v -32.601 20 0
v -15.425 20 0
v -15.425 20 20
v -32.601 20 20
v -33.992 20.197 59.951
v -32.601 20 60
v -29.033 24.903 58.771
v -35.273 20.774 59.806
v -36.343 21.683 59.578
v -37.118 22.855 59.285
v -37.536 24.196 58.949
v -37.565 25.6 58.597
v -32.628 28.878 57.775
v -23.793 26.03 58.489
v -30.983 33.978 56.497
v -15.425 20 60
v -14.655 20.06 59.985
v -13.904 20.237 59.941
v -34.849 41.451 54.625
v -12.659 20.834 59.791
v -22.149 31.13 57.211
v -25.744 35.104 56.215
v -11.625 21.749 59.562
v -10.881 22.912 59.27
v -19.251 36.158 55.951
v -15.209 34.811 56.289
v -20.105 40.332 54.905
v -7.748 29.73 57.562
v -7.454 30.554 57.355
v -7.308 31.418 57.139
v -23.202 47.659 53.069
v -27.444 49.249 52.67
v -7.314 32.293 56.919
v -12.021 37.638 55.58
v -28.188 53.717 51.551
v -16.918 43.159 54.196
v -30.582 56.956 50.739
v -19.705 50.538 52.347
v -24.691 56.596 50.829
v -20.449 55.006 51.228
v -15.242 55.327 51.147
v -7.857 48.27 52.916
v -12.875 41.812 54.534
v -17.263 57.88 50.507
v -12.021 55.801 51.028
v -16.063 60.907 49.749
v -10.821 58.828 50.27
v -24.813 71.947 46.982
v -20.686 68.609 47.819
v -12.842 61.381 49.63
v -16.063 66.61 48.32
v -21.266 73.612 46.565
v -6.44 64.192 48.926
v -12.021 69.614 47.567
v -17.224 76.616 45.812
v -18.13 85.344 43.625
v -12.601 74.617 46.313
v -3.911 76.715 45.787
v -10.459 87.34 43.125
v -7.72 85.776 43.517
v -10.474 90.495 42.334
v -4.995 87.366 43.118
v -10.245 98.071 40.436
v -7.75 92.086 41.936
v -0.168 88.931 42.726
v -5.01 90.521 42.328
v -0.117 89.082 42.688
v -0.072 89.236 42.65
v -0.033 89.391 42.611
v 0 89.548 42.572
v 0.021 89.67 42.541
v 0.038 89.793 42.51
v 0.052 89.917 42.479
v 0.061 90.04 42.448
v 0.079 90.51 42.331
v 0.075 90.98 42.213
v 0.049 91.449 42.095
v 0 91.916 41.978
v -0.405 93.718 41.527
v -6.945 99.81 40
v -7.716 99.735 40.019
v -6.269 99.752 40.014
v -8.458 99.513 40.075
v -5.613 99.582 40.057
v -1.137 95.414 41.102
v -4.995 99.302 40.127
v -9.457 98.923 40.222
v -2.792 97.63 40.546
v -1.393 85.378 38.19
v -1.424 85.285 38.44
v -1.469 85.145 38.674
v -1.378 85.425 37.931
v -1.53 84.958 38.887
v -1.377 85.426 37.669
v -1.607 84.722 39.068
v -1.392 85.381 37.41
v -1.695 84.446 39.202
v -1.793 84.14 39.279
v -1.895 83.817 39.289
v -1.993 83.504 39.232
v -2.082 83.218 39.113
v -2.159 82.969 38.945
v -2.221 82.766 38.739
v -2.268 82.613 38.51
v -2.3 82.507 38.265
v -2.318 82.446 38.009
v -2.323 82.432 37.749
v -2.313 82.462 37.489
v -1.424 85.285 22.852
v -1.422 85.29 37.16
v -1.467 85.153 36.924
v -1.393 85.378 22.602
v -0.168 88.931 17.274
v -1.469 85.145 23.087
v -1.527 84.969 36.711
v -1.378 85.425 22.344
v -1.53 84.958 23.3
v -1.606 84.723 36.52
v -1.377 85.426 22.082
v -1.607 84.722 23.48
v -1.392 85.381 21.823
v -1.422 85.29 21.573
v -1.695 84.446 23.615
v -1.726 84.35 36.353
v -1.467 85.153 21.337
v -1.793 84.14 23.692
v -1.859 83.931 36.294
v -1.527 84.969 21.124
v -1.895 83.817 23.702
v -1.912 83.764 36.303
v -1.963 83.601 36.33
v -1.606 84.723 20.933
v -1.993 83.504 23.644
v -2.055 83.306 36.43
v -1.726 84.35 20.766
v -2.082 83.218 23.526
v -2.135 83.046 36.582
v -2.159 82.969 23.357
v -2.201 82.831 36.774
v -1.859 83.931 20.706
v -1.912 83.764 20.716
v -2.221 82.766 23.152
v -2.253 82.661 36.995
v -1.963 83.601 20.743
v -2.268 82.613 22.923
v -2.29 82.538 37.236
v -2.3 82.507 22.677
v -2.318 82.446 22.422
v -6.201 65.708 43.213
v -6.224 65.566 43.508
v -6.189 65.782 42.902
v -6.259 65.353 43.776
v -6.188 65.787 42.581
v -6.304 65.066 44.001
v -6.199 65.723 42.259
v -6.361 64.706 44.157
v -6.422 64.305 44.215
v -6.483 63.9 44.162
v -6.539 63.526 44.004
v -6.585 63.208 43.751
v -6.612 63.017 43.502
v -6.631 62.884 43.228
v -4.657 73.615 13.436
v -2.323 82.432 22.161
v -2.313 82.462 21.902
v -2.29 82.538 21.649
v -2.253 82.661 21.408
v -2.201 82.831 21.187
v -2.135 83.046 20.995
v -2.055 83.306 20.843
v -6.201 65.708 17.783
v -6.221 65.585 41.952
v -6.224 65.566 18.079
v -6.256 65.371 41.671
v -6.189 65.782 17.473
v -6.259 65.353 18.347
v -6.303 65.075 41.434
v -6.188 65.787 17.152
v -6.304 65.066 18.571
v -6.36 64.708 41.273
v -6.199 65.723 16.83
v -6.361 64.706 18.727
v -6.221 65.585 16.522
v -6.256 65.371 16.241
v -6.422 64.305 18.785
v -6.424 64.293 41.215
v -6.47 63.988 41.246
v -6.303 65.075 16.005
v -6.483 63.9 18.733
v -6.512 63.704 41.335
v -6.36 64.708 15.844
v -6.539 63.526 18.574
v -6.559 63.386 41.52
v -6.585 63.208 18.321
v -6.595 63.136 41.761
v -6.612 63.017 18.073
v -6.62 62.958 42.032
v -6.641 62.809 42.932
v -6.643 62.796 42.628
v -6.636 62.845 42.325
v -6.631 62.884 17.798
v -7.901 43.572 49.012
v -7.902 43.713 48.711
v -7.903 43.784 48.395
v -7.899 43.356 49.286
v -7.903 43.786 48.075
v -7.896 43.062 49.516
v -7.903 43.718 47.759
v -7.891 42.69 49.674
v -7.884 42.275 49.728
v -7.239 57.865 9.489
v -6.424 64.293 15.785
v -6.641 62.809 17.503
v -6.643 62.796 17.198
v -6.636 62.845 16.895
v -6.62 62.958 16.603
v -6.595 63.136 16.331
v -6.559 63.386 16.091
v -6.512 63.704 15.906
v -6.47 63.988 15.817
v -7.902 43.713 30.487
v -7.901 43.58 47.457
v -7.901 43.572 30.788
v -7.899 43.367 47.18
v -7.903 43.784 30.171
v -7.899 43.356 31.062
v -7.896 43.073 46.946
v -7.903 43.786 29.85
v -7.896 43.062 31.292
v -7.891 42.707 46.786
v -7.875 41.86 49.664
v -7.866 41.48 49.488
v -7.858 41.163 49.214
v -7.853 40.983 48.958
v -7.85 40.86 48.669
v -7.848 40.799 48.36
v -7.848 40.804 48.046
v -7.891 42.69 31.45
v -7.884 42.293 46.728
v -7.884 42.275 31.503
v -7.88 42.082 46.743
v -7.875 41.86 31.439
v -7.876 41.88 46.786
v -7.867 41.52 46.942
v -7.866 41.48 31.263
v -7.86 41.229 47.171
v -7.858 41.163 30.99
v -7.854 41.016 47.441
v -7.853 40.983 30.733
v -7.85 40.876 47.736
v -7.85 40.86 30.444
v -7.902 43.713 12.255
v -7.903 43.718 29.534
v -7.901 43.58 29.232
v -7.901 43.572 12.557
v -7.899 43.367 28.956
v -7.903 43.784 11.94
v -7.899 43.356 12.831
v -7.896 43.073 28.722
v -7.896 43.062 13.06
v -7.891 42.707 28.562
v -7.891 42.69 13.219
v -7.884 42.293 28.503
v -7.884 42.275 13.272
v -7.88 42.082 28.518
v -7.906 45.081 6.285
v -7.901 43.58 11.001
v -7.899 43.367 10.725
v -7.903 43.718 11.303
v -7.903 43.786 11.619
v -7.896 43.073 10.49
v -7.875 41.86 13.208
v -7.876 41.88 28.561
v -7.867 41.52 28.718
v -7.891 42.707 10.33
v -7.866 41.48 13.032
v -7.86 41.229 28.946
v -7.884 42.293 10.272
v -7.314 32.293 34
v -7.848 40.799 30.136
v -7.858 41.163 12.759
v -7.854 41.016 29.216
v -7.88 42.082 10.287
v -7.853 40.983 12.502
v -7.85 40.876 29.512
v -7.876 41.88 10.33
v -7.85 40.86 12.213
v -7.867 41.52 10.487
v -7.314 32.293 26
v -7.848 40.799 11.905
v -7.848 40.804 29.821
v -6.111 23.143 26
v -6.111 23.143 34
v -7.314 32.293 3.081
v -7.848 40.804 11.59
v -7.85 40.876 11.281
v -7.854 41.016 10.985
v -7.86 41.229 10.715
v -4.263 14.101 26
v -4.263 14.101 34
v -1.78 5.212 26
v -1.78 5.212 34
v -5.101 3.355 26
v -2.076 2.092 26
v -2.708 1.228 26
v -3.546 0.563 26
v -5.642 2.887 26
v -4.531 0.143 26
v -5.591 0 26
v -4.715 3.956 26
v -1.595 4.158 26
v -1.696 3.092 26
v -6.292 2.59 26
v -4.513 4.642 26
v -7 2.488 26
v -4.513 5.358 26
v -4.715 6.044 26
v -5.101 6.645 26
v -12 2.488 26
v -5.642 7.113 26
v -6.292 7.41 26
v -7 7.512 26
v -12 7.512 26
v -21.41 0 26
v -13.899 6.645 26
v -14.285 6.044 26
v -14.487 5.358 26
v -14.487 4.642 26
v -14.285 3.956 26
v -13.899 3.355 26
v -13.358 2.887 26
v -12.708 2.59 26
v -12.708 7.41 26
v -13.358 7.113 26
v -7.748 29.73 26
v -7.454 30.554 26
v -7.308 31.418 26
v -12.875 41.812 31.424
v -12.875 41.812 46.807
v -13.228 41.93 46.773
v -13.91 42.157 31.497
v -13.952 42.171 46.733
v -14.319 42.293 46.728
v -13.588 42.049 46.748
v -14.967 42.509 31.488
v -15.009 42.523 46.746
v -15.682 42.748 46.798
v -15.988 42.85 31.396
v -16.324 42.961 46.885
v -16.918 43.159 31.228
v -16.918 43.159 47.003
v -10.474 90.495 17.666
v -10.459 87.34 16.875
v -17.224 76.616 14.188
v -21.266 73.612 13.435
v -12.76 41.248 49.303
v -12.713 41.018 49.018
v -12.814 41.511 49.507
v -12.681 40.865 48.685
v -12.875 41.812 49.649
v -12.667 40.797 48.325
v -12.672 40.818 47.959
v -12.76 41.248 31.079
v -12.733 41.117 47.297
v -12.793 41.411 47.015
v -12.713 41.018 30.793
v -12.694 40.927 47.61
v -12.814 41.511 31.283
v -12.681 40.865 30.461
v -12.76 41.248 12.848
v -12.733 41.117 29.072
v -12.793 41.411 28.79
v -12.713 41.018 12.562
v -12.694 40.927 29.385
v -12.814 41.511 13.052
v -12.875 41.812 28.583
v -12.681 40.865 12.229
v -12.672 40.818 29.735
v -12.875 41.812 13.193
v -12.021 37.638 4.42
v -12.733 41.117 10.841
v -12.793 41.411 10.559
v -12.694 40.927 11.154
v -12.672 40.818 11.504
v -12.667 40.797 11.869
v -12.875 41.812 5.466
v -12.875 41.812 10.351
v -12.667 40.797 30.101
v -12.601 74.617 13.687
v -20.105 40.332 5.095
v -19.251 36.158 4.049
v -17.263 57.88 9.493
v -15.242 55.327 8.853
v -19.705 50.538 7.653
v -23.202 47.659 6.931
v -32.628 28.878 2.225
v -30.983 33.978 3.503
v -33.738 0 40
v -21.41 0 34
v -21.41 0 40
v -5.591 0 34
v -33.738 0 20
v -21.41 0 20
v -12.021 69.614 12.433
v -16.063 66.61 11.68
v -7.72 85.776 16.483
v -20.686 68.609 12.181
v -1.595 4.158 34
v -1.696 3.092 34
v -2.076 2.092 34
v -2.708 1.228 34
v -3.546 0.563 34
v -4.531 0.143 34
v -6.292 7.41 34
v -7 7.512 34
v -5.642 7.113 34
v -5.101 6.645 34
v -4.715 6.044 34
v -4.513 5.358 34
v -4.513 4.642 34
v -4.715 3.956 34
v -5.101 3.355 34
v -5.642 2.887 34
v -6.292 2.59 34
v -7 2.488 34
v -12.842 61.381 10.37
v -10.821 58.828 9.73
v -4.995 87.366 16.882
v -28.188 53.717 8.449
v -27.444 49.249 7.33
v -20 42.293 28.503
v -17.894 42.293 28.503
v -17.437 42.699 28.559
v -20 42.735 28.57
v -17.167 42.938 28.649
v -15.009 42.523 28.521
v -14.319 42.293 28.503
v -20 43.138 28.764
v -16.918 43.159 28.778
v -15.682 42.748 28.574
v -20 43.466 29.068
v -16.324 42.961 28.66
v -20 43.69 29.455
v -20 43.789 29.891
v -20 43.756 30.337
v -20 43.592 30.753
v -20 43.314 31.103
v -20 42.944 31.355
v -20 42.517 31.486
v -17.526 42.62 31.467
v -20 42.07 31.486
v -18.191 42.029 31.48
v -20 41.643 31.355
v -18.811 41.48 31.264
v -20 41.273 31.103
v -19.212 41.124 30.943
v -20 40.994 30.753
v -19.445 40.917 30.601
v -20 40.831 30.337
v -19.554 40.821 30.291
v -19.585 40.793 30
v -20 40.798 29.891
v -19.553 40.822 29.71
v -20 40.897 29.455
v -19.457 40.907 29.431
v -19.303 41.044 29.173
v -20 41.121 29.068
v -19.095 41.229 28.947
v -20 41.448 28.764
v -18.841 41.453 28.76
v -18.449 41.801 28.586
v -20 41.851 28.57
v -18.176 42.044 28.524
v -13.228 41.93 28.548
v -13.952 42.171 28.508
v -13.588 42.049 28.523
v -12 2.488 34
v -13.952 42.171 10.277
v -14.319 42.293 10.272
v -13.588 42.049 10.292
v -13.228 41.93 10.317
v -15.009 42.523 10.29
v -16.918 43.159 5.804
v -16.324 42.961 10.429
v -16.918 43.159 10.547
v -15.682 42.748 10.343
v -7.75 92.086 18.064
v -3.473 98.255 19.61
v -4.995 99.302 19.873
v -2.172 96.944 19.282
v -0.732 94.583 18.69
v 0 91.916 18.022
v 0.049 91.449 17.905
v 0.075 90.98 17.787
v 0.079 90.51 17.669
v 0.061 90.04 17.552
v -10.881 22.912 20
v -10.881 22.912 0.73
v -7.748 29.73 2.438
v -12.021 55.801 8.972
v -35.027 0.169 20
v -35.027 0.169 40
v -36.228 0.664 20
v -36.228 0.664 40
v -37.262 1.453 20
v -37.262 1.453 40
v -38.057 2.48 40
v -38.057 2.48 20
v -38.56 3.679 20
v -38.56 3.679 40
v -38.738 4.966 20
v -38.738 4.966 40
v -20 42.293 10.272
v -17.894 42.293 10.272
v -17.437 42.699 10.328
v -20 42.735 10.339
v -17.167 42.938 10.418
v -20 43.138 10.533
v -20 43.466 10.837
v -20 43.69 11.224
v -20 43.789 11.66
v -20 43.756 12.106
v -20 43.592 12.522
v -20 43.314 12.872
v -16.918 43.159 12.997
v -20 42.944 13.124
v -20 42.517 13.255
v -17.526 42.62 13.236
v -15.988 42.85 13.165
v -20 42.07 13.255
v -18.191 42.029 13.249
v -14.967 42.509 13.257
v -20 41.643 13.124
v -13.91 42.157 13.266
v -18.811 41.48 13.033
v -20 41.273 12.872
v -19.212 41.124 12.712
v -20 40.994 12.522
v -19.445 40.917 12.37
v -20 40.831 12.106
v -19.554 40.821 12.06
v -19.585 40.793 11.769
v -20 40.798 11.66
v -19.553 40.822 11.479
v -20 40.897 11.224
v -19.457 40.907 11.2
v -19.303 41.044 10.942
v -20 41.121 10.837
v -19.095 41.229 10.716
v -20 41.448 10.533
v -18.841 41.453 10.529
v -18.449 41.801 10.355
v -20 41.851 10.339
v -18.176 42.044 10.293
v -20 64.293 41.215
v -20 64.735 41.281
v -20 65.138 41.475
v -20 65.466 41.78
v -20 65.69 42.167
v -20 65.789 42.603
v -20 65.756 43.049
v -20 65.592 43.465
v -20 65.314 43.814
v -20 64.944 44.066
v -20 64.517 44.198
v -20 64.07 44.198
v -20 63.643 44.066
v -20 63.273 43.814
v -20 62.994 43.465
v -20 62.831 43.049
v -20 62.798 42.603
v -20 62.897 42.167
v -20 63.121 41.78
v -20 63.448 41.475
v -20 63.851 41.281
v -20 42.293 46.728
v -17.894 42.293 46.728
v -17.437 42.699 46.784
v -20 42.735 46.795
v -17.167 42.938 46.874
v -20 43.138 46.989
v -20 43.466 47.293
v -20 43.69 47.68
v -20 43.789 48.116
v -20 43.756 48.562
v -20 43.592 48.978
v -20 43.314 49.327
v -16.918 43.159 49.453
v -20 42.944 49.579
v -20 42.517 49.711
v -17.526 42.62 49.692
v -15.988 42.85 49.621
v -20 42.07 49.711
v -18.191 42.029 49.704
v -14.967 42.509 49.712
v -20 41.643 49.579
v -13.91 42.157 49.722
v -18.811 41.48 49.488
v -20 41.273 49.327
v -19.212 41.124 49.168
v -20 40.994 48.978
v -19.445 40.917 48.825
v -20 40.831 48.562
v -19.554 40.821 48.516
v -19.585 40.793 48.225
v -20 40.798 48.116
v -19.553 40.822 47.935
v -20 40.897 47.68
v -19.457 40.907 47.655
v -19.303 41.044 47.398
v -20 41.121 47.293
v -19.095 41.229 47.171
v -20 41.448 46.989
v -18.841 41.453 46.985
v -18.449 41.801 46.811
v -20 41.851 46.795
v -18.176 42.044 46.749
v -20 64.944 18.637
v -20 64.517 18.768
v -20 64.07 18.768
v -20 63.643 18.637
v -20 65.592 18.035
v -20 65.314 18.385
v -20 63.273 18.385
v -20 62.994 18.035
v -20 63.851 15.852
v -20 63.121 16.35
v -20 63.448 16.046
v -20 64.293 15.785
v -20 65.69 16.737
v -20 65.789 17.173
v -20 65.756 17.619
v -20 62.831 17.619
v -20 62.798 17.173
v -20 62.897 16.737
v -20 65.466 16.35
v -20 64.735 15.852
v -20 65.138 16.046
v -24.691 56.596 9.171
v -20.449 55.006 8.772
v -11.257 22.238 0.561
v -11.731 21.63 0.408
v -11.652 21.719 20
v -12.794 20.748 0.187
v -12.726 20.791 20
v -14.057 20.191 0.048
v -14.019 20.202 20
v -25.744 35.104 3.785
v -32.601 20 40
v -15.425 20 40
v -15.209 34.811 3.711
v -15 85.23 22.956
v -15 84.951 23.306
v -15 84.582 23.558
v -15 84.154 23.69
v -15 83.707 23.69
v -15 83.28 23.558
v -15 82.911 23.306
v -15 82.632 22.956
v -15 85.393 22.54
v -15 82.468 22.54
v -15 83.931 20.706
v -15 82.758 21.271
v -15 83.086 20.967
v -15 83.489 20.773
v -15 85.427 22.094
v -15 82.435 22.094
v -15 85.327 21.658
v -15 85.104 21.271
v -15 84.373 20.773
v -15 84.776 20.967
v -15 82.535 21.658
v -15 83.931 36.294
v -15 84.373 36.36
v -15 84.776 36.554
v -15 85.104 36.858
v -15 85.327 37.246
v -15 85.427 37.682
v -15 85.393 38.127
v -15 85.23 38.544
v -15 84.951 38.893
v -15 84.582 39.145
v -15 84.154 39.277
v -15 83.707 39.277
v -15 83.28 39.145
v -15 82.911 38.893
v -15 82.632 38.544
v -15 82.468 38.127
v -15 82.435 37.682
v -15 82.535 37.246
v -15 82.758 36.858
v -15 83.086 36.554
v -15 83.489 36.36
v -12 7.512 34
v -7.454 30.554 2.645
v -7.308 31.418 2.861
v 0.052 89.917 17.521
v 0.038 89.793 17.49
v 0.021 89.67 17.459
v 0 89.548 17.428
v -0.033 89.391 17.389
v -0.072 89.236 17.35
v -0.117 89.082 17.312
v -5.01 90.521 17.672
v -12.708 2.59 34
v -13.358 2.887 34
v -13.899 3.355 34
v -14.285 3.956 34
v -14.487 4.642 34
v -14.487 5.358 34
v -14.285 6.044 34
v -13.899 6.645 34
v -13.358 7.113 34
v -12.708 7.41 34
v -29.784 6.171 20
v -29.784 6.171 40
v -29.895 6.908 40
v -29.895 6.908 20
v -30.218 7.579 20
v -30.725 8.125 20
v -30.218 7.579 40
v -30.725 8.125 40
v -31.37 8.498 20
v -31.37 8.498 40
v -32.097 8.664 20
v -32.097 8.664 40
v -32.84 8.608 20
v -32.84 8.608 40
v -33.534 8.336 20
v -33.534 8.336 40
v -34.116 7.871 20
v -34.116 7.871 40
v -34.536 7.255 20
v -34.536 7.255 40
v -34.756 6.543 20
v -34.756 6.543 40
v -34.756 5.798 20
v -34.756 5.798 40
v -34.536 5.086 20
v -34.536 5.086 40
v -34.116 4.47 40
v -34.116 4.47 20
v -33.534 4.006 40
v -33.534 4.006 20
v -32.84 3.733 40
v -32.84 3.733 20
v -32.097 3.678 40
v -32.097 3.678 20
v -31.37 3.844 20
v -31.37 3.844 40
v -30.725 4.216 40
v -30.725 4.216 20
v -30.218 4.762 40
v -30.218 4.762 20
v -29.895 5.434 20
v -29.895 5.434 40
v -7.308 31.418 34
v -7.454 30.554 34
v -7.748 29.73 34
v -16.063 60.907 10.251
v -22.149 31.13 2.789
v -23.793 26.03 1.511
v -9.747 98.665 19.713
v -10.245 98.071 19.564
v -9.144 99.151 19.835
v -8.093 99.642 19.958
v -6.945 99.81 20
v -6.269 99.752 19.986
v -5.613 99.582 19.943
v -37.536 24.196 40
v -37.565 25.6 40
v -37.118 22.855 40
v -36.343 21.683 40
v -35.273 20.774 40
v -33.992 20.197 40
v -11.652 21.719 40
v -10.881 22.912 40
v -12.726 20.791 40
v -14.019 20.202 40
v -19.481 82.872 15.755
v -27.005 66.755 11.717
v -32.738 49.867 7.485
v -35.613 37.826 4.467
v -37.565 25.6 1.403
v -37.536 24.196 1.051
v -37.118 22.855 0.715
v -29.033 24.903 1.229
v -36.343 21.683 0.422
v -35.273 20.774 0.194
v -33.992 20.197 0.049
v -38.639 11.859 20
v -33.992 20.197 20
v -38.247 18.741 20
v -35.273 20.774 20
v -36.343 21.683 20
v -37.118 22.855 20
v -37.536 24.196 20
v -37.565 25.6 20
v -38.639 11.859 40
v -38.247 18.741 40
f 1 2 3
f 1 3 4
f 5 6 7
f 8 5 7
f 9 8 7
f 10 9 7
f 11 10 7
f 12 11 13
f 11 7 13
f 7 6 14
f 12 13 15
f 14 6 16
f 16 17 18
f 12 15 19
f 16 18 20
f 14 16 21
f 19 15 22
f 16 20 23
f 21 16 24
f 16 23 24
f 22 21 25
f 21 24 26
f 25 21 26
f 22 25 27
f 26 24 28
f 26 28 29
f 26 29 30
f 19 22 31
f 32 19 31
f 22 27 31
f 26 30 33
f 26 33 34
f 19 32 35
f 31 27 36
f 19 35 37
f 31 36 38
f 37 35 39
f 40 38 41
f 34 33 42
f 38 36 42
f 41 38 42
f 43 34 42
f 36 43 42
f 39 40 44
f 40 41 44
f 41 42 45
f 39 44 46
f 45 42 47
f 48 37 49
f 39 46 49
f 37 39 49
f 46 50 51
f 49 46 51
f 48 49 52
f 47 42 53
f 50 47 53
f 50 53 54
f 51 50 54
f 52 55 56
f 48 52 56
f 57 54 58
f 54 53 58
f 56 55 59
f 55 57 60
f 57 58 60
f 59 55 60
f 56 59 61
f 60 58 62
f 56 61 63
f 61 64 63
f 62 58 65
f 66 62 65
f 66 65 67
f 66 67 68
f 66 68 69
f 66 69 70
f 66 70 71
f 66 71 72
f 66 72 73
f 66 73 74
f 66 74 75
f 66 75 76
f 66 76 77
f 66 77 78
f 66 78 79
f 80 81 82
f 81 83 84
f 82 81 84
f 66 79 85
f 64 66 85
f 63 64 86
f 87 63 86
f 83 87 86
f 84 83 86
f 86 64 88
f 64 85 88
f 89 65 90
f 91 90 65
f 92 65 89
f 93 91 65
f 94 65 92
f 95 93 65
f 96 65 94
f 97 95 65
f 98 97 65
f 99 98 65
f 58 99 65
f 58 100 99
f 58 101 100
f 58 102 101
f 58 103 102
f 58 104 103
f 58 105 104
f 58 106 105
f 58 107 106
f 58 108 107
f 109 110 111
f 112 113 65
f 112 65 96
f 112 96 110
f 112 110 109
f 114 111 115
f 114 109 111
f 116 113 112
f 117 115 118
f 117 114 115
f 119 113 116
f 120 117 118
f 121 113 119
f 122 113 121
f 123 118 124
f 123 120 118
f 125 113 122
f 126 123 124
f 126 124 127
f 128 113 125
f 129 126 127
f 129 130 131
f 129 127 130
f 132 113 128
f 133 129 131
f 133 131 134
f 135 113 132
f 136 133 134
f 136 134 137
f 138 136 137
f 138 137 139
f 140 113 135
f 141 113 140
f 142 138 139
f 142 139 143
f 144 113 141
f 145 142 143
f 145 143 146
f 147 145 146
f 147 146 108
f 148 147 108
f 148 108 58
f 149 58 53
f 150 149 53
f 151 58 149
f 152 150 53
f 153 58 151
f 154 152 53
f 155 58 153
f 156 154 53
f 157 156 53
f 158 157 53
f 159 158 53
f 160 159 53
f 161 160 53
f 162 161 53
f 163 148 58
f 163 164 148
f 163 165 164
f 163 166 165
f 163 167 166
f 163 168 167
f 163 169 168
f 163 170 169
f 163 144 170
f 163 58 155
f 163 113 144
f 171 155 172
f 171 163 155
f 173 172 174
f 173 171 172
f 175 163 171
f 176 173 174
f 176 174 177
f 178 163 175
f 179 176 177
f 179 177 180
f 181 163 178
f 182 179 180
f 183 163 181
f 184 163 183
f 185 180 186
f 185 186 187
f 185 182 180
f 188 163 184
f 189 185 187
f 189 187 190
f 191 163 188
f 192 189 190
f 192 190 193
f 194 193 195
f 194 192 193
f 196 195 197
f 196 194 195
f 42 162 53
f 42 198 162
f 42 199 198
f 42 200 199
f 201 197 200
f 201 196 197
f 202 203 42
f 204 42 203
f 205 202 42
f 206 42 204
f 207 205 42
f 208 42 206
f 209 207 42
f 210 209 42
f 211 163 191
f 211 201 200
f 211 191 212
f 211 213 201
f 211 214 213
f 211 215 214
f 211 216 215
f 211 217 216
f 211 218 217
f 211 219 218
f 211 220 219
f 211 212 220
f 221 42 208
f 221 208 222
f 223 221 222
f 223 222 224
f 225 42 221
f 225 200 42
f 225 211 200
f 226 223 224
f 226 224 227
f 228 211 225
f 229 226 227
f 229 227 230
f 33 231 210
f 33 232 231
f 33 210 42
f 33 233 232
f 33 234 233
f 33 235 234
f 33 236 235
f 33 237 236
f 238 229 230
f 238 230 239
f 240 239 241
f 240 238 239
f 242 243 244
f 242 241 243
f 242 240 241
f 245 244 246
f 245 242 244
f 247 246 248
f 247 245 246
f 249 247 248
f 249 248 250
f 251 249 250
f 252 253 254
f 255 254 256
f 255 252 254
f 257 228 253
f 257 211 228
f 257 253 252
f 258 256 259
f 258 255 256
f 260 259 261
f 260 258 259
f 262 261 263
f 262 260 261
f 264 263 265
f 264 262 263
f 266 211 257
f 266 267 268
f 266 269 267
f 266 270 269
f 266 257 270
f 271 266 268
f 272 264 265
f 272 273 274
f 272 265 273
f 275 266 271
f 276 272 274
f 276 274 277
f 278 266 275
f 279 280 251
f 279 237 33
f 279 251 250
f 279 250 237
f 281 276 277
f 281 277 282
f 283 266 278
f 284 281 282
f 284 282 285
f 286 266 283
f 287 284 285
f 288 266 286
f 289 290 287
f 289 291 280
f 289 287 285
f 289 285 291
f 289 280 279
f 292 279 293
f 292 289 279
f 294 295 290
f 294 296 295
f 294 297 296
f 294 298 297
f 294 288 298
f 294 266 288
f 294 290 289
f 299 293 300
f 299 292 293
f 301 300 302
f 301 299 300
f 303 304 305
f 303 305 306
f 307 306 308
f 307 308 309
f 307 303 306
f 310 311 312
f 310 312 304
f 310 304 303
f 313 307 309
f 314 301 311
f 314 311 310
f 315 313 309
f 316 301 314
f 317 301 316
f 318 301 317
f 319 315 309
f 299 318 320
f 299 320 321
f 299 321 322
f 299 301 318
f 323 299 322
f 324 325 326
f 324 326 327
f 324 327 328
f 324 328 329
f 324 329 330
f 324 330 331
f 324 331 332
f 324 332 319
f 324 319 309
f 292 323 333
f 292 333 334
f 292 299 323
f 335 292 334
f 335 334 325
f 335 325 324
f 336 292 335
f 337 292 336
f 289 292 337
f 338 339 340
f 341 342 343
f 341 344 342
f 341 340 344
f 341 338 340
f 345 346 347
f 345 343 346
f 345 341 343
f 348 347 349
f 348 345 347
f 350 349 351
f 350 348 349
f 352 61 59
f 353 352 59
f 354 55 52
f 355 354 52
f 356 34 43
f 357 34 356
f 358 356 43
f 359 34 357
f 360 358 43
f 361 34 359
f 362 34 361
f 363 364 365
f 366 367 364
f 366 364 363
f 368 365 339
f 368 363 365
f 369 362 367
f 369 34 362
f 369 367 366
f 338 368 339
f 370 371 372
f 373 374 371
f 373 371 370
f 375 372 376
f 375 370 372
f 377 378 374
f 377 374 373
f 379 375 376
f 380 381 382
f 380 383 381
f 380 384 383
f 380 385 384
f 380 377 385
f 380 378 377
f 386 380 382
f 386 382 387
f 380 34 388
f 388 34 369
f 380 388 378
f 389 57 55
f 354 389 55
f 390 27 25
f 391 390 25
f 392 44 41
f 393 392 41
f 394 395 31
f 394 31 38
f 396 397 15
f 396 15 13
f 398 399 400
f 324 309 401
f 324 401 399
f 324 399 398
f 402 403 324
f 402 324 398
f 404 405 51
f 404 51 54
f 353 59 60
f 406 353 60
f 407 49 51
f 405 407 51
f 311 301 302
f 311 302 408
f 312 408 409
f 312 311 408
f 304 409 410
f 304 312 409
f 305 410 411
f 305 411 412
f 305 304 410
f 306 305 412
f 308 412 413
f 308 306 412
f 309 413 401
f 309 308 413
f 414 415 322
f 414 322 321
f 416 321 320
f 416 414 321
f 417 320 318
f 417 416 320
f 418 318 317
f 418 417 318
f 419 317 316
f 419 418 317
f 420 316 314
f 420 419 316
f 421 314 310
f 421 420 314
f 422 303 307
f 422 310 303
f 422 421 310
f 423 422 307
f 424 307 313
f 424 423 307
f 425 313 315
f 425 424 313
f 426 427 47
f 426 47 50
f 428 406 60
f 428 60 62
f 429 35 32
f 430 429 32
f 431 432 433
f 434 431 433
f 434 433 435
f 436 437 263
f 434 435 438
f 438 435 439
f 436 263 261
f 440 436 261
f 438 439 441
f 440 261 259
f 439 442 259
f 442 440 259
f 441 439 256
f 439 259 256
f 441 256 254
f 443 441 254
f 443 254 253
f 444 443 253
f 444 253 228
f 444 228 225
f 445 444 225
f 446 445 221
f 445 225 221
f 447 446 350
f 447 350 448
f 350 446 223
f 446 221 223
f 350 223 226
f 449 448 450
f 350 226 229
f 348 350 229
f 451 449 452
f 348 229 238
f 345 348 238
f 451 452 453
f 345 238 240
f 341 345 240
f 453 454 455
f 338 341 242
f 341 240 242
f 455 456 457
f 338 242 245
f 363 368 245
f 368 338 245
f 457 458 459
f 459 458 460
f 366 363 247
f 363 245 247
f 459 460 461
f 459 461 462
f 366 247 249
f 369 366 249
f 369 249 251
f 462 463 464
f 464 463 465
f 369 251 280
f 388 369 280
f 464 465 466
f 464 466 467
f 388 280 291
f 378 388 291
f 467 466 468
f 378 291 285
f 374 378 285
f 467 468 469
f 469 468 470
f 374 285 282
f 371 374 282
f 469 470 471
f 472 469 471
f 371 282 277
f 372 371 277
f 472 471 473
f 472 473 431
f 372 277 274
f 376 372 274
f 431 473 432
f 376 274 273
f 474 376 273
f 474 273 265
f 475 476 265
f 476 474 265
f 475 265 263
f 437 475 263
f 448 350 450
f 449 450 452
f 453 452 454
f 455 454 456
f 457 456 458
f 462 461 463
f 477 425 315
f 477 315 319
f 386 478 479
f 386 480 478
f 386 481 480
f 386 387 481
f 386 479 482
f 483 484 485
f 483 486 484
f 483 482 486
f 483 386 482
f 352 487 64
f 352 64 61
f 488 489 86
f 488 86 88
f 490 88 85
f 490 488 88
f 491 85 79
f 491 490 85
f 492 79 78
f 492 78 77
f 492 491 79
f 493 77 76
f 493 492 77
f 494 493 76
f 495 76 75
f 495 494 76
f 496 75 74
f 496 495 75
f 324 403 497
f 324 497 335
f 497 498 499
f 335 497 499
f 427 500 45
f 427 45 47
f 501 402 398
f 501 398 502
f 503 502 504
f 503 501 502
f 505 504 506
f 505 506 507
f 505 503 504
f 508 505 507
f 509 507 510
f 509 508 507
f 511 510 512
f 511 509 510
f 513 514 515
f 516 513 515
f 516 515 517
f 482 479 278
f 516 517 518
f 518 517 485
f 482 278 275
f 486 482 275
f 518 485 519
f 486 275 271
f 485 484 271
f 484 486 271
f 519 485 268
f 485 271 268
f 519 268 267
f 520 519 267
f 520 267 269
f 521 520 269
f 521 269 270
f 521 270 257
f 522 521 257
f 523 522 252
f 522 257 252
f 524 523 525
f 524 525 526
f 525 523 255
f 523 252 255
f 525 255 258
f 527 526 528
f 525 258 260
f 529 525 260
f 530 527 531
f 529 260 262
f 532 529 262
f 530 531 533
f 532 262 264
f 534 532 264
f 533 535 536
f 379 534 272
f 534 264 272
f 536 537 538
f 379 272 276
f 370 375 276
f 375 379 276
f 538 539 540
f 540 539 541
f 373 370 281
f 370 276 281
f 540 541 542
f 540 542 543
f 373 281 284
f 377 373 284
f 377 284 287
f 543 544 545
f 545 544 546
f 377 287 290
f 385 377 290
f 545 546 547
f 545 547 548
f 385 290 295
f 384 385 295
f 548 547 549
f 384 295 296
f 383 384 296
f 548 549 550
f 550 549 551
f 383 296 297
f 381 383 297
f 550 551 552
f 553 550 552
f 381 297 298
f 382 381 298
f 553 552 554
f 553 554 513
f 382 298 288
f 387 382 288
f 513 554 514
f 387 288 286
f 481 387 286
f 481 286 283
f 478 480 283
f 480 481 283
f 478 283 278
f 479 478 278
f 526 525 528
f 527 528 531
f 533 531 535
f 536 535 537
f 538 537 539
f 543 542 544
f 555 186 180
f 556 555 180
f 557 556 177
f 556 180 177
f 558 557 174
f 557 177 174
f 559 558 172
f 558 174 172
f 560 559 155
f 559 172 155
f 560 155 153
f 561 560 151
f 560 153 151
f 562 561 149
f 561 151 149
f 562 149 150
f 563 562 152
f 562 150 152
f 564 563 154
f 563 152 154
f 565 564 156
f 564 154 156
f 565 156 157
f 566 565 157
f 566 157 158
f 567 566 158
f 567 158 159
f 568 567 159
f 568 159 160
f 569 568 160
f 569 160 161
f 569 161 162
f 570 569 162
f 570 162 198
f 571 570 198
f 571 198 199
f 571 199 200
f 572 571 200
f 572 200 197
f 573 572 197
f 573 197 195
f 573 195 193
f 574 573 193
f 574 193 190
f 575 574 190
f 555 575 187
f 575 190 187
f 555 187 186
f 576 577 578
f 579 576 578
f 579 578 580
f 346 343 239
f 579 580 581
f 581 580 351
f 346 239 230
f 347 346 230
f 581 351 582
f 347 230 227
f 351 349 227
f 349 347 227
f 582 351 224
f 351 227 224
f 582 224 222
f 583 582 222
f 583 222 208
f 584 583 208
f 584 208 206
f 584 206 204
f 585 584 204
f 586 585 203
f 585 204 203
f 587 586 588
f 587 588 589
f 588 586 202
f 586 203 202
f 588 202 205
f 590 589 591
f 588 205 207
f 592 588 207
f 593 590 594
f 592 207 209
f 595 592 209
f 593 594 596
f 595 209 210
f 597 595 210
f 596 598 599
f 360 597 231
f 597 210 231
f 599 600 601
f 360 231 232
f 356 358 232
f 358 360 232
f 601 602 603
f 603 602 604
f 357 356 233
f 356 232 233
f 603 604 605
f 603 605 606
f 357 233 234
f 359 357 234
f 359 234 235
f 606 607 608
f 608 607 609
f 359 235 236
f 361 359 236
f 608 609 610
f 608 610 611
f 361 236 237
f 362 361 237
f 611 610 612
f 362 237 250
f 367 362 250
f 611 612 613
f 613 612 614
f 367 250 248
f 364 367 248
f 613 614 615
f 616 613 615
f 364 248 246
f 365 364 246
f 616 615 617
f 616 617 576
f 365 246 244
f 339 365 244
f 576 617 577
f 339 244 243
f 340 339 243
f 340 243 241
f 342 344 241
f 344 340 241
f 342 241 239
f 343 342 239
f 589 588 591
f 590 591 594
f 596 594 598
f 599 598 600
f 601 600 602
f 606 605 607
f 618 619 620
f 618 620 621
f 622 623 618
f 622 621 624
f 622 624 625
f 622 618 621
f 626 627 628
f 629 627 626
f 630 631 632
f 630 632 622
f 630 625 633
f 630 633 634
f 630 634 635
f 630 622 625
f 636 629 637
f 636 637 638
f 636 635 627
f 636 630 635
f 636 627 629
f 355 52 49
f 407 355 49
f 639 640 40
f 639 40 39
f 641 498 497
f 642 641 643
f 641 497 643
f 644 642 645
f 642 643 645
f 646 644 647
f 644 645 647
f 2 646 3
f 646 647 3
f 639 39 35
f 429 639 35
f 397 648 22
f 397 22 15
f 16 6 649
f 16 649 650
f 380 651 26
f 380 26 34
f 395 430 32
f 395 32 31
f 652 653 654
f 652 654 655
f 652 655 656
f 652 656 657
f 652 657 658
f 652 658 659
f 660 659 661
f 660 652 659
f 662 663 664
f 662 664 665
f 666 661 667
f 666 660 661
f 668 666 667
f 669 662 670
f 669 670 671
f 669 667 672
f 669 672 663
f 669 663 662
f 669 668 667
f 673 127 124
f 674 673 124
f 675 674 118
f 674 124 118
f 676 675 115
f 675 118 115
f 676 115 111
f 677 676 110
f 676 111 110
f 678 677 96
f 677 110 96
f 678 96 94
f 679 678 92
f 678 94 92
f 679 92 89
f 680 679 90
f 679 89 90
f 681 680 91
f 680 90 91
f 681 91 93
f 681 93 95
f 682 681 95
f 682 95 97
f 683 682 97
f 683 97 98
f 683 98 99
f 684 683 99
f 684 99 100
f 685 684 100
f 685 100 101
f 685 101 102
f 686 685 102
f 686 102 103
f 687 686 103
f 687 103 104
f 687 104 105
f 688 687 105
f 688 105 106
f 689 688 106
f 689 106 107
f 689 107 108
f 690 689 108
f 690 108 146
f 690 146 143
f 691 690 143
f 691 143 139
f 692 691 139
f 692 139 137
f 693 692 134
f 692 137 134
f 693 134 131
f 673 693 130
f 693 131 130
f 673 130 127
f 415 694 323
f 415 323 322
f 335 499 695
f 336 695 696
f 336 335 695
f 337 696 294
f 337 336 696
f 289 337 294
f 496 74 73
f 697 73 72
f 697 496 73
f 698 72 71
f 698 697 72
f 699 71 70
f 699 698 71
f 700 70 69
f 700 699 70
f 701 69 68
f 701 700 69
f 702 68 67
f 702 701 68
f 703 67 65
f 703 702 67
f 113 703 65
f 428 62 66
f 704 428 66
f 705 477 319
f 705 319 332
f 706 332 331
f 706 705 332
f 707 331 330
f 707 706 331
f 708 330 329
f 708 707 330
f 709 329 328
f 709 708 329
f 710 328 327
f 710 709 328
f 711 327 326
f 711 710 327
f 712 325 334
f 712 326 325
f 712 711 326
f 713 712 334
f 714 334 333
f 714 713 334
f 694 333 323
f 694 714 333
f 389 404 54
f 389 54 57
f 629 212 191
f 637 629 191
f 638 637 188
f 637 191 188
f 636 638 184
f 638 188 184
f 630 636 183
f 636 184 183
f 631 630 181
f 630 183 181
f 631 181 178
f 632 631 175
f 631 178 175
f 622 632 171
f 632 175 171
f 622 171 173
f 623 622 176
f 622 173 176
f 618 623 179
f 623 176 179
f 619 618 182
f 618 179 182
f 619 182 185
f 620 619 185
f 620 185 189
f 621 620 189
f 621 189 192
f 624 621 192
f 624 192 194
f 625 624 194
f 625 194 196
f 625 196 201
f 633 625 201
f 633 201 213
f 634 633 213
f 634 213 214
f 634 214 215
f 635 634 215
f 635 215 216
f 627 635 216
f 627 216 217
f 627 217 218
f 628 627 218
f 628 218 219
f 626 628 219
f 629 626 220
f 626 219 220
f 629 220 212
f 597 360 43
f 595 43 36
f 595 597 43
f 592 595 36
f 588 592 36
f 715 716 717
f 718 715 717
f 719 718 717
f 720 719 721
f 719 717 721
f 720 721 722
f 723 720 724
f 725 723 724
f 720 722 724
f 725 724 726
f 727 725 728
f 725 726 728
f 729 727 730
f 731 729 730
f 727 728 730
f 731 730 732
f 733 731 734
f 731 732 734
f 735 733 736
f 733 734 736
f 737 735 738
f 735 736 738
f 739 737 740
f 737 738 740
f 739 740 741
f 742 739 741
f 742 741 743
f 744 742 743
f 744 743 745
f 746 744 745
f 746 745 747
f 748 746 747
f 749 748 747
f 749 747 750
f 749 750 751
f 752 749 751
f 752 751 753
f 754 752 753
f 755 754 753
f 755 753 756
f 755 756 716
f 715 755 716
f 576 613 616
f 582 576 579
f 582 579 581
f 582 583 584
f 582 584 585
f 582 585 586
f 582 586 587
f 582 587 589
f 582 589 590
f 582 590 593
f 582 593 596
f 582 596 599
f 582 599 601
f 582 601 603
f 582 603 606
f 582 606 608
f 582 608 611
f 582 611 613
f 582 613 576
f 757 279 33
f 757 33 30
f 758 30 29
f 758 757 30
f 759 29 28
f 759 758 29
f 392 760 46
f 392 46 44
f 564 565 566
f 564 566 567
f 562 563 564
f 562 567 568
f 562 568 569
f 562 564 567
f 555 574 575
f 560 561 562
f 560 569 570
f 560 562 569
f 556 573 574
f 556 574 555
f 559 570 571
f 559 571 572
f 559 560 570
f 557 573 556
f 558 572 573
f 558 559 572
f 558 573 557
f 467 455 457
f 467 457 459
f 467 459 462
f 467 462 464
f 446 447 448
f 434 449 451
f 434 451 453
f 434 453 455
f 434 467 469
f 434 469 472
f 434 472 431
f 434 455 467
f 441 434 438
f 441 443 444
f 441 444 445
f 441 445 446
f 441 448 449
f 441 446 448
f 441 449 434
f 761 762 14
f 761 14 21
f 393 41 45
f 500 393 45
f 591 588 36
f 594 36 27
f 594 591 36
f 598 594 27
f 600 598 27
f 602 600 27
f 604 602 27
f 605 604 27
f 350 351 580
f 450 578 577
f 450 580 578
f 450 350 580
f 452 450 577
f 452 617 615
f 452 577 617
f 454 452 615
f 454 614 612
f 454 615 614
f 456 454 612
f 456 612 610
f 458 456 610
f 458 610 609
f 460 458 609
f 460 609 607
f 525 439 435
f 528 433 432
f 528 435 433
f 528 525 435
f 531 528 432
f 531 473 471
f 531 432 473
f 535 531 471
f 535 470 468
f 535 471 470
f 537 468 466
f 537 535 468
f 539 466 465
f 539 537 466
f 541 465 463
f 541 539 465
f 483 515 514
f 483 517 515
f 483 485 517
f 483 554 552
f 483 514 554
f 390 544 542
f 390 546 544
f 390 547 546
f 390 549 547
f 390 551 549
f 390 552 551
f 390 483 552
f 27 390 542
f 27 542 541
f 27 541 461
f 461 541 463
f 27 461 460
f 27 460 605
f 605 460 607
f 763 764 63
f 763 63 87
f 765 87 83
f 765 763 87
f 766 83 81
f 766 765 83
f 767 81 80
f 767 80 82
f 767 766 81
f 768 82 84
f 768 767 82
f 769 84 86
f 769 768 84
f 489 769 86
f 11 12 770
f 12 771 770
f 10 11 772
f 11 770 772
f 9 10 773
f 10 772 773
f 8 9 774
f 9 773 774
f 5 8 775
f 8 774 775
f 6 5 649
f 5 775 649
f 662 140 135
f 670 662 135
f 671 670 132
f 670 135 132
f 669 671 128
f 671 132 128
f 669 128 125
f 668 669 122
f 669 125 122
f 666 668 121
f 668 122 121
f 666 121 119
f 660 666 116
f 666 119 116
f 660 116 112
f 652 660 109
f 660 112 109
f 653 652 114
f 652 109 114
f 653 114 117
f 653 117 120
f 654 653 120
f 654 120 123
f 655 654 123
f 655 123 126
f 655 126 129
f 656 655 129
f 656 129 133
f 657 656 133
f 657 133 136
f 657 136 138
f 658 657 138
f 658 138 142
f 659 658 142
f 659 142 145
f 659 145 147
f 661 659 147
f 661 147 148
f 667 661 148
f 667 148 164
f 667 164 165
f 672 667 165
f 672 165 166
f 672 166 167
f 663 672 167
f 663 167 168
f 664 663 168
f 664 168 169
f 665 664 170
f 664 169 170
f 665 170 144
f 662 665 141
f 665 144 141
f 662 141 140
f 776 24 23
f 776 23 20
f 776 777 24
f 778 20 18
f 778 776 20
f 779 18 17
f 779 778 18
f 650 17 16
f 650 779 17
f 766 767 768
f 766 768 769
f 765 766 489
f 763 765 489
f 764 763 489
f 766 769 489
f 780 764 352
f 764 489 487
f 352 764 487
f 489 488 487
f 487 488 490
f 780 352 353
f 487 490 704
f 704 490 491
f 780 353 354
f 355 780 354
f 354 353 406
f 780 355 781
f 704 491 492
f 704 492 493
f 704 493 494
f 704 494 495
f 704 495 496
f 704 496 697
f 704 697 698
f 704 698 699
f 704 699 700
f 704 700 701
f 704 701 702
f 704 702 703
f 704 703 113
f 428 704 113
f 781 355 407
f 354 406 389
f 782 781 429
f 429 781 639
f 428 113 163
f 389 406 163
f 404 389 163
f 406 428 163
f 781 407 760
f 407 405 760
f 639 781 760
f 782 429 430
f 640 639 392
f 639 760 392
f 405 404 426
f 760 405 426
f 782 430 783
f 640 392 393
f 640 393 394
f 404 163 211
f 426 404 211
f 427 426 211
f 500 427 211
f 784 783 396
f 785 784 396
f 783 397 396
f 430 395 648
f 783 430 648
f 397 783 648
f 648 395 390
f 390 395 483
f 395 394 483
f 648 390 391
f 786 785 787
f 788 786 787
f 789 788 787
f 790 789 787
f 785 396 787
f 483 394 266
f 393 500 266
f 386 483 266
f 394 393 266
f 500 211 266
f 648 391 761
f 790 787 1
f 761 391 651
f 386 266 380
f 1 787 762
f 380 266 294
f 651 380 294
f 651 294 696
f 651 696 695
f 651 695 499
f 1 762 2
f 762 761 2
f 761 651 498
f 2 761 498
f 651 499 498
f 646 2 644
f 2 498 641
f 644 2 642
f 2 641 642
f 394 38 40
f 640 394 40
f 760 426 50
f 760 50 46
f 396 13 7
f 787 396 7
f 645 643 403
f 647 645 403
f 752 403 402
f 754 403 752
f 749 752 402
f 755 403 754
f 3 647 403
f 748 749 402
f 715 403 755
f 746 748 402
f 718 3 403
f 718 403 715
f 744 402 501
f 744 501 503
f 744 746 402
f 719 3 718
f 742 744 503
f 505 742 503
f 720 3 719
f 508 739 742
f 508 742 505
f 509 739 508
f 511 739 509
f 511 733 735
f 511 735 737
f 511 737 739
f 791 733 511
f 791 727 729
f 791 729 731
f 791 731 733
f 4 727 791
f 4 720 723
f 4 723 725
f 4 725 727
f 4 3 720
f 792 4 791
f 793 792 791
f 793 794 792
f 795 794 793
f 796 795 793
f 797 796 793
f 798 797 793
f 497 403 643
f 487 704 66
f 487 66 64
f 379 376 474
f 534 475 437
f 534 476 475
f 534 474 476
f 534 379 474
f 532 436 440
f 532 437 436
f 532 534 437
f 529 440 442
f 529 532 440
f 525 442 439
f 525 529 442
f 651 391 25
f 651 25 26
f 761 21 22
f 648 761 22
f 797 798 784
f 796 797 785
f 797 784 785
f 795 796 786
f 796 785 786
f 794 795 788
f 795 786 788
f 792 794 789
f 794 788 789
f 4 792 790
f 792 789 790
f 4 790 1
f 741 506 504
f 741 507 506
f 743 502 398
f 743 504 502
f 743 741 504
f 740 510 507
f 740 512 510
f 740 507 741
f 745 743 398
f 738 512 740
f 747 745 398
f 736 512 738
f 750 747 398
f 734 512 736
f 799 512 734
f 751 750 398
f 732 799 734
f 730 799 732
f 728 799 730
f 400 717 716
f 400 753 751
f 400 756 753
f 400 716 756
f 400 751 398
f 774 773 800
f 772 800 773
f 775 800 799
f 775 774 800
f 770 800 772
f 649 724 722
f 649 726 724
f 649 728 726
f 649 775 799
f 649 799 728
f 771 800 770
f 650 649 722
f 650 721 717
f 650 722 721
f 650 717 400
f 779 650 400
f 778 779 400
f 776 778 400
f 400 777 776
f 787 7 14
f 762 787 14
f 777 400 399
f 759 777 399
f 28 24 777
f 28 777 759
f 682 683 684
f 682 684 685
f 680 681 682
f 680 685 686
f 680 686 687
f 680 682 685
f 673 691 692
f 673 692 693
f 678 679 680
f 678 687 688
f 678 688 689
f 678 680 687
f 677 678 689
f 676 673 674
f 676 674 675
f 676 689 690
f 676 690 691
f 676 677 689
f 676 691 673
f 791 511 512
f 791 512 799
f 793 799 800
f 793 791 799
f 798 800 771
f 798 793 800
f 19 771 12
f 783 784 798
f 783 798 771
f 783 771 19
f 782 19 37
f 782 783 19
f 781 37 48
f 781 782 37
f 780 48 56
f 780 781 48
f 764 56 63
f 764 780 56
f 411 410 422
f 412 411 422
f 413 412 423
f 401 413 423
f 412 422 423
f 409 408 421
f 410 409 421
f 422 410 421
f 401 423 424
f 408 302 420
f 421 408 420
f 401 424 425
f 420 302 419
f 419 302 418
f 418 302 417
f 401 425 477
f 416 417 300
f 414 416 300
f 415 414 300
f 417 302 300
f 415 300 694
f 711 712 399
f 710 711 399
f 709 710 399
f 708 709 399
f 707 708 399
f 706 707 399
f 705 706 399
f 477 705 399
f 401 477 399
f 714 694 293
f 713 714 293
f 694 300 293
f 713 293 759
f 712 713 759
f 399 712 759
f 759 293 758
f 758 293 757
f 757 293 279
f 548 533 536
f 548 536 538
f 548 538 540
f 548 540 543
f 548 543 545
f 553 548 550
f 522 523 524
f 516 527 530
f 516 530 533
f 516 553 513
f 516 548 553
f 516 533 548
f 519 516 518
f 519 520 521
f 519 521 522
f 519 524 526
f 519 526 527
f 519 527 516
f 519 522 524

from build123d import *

# Parameters (mm, degrees)
BOSS_EXTRUDE4_DEPTH = 60
CUT_EXTRUDE2_DEPTH  = 60
SKETCH8_R           = 2.5
CUT_EXTRUDE3_DEPTH  = 60
CUT_EXTRUDE4_DEPTH  = 26
CUT_EXTRUDE5_DEPTH  = 26
SKETCH11_W          = 44.110265297
SKETCH11_H          = 23.925311971
CUT_EXTRUDE6_DEPTH  = 20
SKETCH12_W          = 40.66810553
SKETCH12_H          = 24.82561344
CUT_EXTRUDE7_DEPTH  = 20
FILLET1_R           = 5
FILLET2_R           = 5
FILLET3_R           = 5
FILLET4_R           = 5
FILLET5_R           = 5
FILLET6_R           = 5
CUT_EXTRUDE8_DEPTH  = 53
CUT_EXTRUDE9_DEPTH  = 40
CUT_EXTRUDE10_DEPTH = 40
CUT_EXTRUDE11_DEPTH = 49
SKETCH17_R          = 1.5
CUT_EXTRUDE12_DEPTH = 20
SKETCH18_R          = 1.5
CUT_EXTRUDE13_DEPTH = 20
SKETCH20_R          = 1.5
CUT_EXTRUDE14_DEPTH = 20
SKETCH21_R          = 1.5
CUT_EXTRUDE15_DEPTH = 20
SKETCH22_R          = 1.5
CUT_EXTRUDE16_DEPTH = 20
SKETCH23_R          = 1.5
CUT_EXTRUDE17_DEPTH = 15
SKETCH24_R          = 1.5
CUT_EXTRUDE18_DEPTH = 15


with BuildPart() as part:
    # Sketch5 → Boss-Extrude4 (new body)
    with BuildSketch(Plane.XY):
        with BuildLine():
            Line((-5.591433469, 0), (-33.737961989, 0))
            ThreePointArc((-33.737961989, 0), (-37.261513388, 1.45252406), (-38.737847513, 4.966165783))
            ThreePointArc((-38.737847513, 4.966165783), (-31.616240623, 53.699065918), (-10.244585549, 98.070962427))
            ThreePointArc((-10.244585549, 98.070962427), (-7.858330599, 99.704279242), (-4.994698694, 99.302347885))
            ThreePointArc((-4.994698694, 99.302347885), (-1.130402236, 95.400824643), (0.061459935, 90.040401592))
            ThreePointArc((0.061459935, 90.040401592), (-0.013962808, 89.477441364), (-0.168362399, 88.93083952))
            ThreePointArc((-0.168362399, 88.93083952), (-7.882068029, 47.204430035), (-1.77951237, 5.212129342))
            ThreePointArc((-1.77951237, 5.212129342), (-2.362771411, 1.638699232), (-5.591433469, 0))
        make_face()
        Polygon((-23.793249775, 26.029552985), (-22.148877555, 31.130017156), (-25.743822989, 35.104317357), (-30.983140641, 33.978153386), (-32.627512861, 28.877689216), (-29.032567427, 24.903389015), align=None, mode=Mode.SUBTRACT)
        Polygon((-19.704548153, 50.537737556), (-20.448711238, 55.006105989), (-24.690513357, 56.595826069), (-28.18815239, 53.717177716), (-27.443989306, 49.248809284), (-23.202187187, 47.659089203), align=None, mode=Mode.SUBTRACT)
        Polygon((-12.020901099, 69.614378519), (-12.60140651, 74.617120781), (-17.224161103, 76.615759479), (-21.266410285, 73.611655915), (-20.685904874, 68.608913653), (-16.063150281, 66.610274955), align=None, mode=Mode.SUBTRACT)
        Polygon((-4.994698694, 87.366252749), (-5.009667304, 90.521352685), (-7.749548306, 92.085939457), (-10.474460698, 90.495426291), (-10.459492087, 87.340326355), (-7.719611085, 85.775739583), align=None, mode=Mode.SUBTRACT)
        Polygon((-12.020901099, 37.637700147), (-12.875266359, 41.812019441), (-16.917515541, 43.159277068), (-20.105399463, 40.332215402), (-19.251034203, 36.157896108), (-15.208785021, 34.810638481), align=None, mode=Mode.SUBTRACT)
        Polygon((-12.020901099, 55.800966029), (-10.82059125, 58.827758896), (-12.841715841, 61.380654151), (-16.063150281, 60.906756539), (-17.263460129, 57.879963671), (-15.242335538, 55.327068416), align=None, mode=Mode.SUBTRACT)
    extrude(amount=BOSS_EXTRUDE4_DEPTH)

    # Sketch7 → Cut-Extrude2 (cut)
    with BuildSketch(Plane.XY.offset(60)):
        with BuildLine():
            Line((-12, 7.5121344), (-7, 7.5121344))
            ThreePointArc((-7, 7.5121344), (-4.4878656, 5), (-7, 2.4878656))
            Line((-7, 2.4878656), (-12, 2.4878656))
            ThreePointArc((-12, 2.4878656), (-14.5121344, 5), (-12, 7.5121344))
        make_face()
    extrude(amount=-CUT_EXTRUDE2_DEPTH, mode=Mode.SUBTRACT)

    # Sketch8 → Cut-Extrude3 (cut)
    with BuildSketch(Plane.XY.offset(60)):
        with Locations((-32.283791832, 6.170765259)):
            Circle(SKETCH8_R)
    extrude(amount=-CUT_EXTRUDE3_DEPTH, mode=Mode.SUBTRACT)

    # Sketch9 → Cut-Extrude4 (cut)
    with BuildSketch(Plane.XY):
        Polygon((0, 0), (-21.41, 0), (-7.180593074, 30.965416872), align=None)
    extrude(amount=CUT_EXTRUDE4_DEPTH, mode=Mode.SUBTRACT)

    # Sketch10 → Cut-Extrude5 (cut)
    with BuildSketch(Plane.XY.offset(60)):
        Polygon((0, 0), (-21.41, 0), (-7.180593074, 30.965416872), align=None)
    extrude(amount=-CUT_EXTRUDE5_DEPTH, mode=Mode.SUBTRACT)

    # Sketch11 → Cut-Extrude6 (cut)
    with BuildSketch(Plane.XY.offset(60)):
        with Locations((-22.055132649, 8.037344015)):
            Rectangle(SKETCH11_W, SKETCH11_H)
    extrude(amount=-CUT_EXTRUDE6_DEPTH, mode=Mode.SUBTRACT)

    # Sketch12 → Cut-Extrude7 (cut)
    with BuildSketch(Plane(origin=(0, 0, 0), x_dir=(-1, 0, 0), z_dir=(0, 0, -1))):
        with Locations((20.334052765, 7.58719328)):
            Rectangle(SKETCH12_W, SKETCH12_H)
    extrude(amount=-CUT_EXTRUDE7_DEPTH, mode=Mode.SUBTRACT)

    # Fillet1
    fillet1_edges = [part.edges().sort_by_distance(p)[0] for p in [
        (-12.219484668, 20, 50),
    ]]
    fillet(fillet1_edges, radius=FILLET1_R)

    # Fillet2
    fillet2_edges = [part.edges().sort_by_distance(p)[0] for p in [
        (-7.180593074, 30.965416872, 47),
    ]]
    fillet(fillet2_edges, radius=FILLET2_R)

    # Fillet3
    fillet3_edges = [part.edges().sort_by_distance(p)[0] for p in [
        (-12.219484668, 20, 10),
    ]]
    fillet(fillet3_edges, radius=FILLET3_R)

    # Fillet4
    fillet4_edges = [part.edges().sort_by_distance(p)[0] for p in [
        (-7.180593074, 30.965416872, 13),
    ]]
    fillet(fillet4_edges, radius=FILLET4_R)

    # Fillet5
    fillet5_edges = [part.edges().sort_by_distance(p)[0] for p in [
        (-38.144186452, 20, 10),
    ]]
    fillet(fillet5_edges, radius=FILLET5_R)

    # Fillet6
    fillet6_edges = [part.edges().sort_by_distance(p)[0] for p in [
        (-38.144186452, 20, 50),
    ]]
    fillet(fillet6_edges, radius=FILLET6_R)

    # Sketch15 → Cut-Extrude8 (cut)
    with BuildSketch(Plane(origin=(0, 0, 0), x_dir=(0, 0, -1), z_dir=(1, 0, 0))):
        Polygon((-60, 20), (-40, 99.809969504), (-60, 99.809969504), align=None)
    extrude(amount=-CUT_EXTRUDE8_DEPTH, mode=Mode.SUBTRACT)

    # Sketch15<2> → Cut-Extrude9 (cut)
    with BuildSketch(Plane(origin=(0, 0, 0), x_dir=(0, 0, -1), z_dir=(1, 0, 0))):
        Polygon((-60, 20), (-40, 99.809969504), (-60, 99.809969504), align=None)
    extrude(amount=CUT_EXTRUDE9_DEPTH, mode=Mode.SUBTRACT)

    # Sketch16 → Cut-Extrude10 (cut)
    with BuildSketch(Plane(origin=(0, 0, 0), x_dir=(0, 0, -1), z_dir=(1, 0, 0))):
        Polygon((0, 20), (0, 99.809969504), (-20, 99.809969504), align=None)
    extrude(amount=-CUT_EXTRUDE10_DEPTH, mode=Mode.SUBTRACT)

    # Sketch16<2> → Cut-Extrude11 (cut)
    with BuildSketch(Plane(origin=(0, 0, 0), x_dir=(0, 0, -1), z_dir=(1, 0, 0))):
        Polygon((0, 20), (0, 99.809969504), (-20, 99.809969504), align=None)
    extrude(amount=CUT_EXTRUDE11_DEPTH, mode=Mode.SUBTRACT)

    # Sketch17 → Cut-Extrude12 (cut)
    with BuildSketch(Plane(origin=(0, 0, 0), x_dir=(0, 0, -1), z_dir=(1, 0, 0))):
        with Locations((-48.227866977, 42.293348251)):
            Circle(SKETCH17_R)
    extrude(amount=-CUT_EXTRUDE12_DEPTH, mode=Mode.SUBTRACT)

    # Sketch18 → Cut-Extrude13 (cut)
    with BuildSketch(Plane(origin=(0, 0, 0), x_dir=(0, 0, -1), z_dir=(1, 0, 0))):
        with Locations((-11.772133023, 42.293348251)):
            Circle(SKETCH18_R)
    extrude(amount=-CUT_EXTRUDE13_DEPTH, mode=Mode.SUBTRACT)

    # Sketch20 → Cut-Extrude14 (cut)
    with BuildSketch(Plane(origin=(0, 0, 0), x_dir=(0, 0, -1), z_dir=(1, 0, 0))):
        with Locations((-30.003246604, 42.293348251)):
            Circle(SKETCH20_R)
    extrude(amount=-CUT_EXTRUDE14_DEPTH, mode=Mode.SUBTRACT)

    # Sketch21 → Cut-Extrude15 (cut)
    with BuildSketch(Plane(origin=(0, 0, 0), x_dir=(0, 0, -1), z_dir=(1, 0, 0))):
        with Locations((-42.714771273, 64.293348251)):
            Circle(SKETCH21_R)
    extrude(amount=-CUT_EXTRUDE15_DEPTH, mode=Mode.SUBTRACT)

    # Sketch22 → Cut-Extrude16 (cut)
    with BuildSketch(Plane(origin=(0, 0, 0), x_dir=(0, 0, -1), z_dir=(1, 0, 0))):
        with Locations((-17.285228727, 64.293348251)):
            Circle(SKETCH22_R)
    extrude(amount=-CUT_EXTRUDE16_DEPTH, mode=Mode.SUBTRACT)

    # Sketch23 → Cut-Extrude17 (cut)
    with BuildSketch(Plane(origin=(0, 0, 0), x_dir=(0, 0, -1), z_dir=(1, 0, 0))):
        with Locations((-37.793709057, 83.93083952)):
            Circle(SKETCH23_R)
    extrude(amount=-CUT_EXTRUDE17_DEPTH, mode=Mode.SUBTRACT)

    # Sketch24 → Cut-Extrude18 (cut)
    with BuildSketch(Plane(origin=(0, 0, 0), x_dir=(0, 0, -1), z_dir=(1, 0, 0))):
        with Locations((-22.206290943, 83.93083952)):
            Circle(SKETCH24_R)
    extrude(amount=-CUT_EXTRUDE18_DEPTH, mode=Mode.SUBTRACT)


solid = part.part
